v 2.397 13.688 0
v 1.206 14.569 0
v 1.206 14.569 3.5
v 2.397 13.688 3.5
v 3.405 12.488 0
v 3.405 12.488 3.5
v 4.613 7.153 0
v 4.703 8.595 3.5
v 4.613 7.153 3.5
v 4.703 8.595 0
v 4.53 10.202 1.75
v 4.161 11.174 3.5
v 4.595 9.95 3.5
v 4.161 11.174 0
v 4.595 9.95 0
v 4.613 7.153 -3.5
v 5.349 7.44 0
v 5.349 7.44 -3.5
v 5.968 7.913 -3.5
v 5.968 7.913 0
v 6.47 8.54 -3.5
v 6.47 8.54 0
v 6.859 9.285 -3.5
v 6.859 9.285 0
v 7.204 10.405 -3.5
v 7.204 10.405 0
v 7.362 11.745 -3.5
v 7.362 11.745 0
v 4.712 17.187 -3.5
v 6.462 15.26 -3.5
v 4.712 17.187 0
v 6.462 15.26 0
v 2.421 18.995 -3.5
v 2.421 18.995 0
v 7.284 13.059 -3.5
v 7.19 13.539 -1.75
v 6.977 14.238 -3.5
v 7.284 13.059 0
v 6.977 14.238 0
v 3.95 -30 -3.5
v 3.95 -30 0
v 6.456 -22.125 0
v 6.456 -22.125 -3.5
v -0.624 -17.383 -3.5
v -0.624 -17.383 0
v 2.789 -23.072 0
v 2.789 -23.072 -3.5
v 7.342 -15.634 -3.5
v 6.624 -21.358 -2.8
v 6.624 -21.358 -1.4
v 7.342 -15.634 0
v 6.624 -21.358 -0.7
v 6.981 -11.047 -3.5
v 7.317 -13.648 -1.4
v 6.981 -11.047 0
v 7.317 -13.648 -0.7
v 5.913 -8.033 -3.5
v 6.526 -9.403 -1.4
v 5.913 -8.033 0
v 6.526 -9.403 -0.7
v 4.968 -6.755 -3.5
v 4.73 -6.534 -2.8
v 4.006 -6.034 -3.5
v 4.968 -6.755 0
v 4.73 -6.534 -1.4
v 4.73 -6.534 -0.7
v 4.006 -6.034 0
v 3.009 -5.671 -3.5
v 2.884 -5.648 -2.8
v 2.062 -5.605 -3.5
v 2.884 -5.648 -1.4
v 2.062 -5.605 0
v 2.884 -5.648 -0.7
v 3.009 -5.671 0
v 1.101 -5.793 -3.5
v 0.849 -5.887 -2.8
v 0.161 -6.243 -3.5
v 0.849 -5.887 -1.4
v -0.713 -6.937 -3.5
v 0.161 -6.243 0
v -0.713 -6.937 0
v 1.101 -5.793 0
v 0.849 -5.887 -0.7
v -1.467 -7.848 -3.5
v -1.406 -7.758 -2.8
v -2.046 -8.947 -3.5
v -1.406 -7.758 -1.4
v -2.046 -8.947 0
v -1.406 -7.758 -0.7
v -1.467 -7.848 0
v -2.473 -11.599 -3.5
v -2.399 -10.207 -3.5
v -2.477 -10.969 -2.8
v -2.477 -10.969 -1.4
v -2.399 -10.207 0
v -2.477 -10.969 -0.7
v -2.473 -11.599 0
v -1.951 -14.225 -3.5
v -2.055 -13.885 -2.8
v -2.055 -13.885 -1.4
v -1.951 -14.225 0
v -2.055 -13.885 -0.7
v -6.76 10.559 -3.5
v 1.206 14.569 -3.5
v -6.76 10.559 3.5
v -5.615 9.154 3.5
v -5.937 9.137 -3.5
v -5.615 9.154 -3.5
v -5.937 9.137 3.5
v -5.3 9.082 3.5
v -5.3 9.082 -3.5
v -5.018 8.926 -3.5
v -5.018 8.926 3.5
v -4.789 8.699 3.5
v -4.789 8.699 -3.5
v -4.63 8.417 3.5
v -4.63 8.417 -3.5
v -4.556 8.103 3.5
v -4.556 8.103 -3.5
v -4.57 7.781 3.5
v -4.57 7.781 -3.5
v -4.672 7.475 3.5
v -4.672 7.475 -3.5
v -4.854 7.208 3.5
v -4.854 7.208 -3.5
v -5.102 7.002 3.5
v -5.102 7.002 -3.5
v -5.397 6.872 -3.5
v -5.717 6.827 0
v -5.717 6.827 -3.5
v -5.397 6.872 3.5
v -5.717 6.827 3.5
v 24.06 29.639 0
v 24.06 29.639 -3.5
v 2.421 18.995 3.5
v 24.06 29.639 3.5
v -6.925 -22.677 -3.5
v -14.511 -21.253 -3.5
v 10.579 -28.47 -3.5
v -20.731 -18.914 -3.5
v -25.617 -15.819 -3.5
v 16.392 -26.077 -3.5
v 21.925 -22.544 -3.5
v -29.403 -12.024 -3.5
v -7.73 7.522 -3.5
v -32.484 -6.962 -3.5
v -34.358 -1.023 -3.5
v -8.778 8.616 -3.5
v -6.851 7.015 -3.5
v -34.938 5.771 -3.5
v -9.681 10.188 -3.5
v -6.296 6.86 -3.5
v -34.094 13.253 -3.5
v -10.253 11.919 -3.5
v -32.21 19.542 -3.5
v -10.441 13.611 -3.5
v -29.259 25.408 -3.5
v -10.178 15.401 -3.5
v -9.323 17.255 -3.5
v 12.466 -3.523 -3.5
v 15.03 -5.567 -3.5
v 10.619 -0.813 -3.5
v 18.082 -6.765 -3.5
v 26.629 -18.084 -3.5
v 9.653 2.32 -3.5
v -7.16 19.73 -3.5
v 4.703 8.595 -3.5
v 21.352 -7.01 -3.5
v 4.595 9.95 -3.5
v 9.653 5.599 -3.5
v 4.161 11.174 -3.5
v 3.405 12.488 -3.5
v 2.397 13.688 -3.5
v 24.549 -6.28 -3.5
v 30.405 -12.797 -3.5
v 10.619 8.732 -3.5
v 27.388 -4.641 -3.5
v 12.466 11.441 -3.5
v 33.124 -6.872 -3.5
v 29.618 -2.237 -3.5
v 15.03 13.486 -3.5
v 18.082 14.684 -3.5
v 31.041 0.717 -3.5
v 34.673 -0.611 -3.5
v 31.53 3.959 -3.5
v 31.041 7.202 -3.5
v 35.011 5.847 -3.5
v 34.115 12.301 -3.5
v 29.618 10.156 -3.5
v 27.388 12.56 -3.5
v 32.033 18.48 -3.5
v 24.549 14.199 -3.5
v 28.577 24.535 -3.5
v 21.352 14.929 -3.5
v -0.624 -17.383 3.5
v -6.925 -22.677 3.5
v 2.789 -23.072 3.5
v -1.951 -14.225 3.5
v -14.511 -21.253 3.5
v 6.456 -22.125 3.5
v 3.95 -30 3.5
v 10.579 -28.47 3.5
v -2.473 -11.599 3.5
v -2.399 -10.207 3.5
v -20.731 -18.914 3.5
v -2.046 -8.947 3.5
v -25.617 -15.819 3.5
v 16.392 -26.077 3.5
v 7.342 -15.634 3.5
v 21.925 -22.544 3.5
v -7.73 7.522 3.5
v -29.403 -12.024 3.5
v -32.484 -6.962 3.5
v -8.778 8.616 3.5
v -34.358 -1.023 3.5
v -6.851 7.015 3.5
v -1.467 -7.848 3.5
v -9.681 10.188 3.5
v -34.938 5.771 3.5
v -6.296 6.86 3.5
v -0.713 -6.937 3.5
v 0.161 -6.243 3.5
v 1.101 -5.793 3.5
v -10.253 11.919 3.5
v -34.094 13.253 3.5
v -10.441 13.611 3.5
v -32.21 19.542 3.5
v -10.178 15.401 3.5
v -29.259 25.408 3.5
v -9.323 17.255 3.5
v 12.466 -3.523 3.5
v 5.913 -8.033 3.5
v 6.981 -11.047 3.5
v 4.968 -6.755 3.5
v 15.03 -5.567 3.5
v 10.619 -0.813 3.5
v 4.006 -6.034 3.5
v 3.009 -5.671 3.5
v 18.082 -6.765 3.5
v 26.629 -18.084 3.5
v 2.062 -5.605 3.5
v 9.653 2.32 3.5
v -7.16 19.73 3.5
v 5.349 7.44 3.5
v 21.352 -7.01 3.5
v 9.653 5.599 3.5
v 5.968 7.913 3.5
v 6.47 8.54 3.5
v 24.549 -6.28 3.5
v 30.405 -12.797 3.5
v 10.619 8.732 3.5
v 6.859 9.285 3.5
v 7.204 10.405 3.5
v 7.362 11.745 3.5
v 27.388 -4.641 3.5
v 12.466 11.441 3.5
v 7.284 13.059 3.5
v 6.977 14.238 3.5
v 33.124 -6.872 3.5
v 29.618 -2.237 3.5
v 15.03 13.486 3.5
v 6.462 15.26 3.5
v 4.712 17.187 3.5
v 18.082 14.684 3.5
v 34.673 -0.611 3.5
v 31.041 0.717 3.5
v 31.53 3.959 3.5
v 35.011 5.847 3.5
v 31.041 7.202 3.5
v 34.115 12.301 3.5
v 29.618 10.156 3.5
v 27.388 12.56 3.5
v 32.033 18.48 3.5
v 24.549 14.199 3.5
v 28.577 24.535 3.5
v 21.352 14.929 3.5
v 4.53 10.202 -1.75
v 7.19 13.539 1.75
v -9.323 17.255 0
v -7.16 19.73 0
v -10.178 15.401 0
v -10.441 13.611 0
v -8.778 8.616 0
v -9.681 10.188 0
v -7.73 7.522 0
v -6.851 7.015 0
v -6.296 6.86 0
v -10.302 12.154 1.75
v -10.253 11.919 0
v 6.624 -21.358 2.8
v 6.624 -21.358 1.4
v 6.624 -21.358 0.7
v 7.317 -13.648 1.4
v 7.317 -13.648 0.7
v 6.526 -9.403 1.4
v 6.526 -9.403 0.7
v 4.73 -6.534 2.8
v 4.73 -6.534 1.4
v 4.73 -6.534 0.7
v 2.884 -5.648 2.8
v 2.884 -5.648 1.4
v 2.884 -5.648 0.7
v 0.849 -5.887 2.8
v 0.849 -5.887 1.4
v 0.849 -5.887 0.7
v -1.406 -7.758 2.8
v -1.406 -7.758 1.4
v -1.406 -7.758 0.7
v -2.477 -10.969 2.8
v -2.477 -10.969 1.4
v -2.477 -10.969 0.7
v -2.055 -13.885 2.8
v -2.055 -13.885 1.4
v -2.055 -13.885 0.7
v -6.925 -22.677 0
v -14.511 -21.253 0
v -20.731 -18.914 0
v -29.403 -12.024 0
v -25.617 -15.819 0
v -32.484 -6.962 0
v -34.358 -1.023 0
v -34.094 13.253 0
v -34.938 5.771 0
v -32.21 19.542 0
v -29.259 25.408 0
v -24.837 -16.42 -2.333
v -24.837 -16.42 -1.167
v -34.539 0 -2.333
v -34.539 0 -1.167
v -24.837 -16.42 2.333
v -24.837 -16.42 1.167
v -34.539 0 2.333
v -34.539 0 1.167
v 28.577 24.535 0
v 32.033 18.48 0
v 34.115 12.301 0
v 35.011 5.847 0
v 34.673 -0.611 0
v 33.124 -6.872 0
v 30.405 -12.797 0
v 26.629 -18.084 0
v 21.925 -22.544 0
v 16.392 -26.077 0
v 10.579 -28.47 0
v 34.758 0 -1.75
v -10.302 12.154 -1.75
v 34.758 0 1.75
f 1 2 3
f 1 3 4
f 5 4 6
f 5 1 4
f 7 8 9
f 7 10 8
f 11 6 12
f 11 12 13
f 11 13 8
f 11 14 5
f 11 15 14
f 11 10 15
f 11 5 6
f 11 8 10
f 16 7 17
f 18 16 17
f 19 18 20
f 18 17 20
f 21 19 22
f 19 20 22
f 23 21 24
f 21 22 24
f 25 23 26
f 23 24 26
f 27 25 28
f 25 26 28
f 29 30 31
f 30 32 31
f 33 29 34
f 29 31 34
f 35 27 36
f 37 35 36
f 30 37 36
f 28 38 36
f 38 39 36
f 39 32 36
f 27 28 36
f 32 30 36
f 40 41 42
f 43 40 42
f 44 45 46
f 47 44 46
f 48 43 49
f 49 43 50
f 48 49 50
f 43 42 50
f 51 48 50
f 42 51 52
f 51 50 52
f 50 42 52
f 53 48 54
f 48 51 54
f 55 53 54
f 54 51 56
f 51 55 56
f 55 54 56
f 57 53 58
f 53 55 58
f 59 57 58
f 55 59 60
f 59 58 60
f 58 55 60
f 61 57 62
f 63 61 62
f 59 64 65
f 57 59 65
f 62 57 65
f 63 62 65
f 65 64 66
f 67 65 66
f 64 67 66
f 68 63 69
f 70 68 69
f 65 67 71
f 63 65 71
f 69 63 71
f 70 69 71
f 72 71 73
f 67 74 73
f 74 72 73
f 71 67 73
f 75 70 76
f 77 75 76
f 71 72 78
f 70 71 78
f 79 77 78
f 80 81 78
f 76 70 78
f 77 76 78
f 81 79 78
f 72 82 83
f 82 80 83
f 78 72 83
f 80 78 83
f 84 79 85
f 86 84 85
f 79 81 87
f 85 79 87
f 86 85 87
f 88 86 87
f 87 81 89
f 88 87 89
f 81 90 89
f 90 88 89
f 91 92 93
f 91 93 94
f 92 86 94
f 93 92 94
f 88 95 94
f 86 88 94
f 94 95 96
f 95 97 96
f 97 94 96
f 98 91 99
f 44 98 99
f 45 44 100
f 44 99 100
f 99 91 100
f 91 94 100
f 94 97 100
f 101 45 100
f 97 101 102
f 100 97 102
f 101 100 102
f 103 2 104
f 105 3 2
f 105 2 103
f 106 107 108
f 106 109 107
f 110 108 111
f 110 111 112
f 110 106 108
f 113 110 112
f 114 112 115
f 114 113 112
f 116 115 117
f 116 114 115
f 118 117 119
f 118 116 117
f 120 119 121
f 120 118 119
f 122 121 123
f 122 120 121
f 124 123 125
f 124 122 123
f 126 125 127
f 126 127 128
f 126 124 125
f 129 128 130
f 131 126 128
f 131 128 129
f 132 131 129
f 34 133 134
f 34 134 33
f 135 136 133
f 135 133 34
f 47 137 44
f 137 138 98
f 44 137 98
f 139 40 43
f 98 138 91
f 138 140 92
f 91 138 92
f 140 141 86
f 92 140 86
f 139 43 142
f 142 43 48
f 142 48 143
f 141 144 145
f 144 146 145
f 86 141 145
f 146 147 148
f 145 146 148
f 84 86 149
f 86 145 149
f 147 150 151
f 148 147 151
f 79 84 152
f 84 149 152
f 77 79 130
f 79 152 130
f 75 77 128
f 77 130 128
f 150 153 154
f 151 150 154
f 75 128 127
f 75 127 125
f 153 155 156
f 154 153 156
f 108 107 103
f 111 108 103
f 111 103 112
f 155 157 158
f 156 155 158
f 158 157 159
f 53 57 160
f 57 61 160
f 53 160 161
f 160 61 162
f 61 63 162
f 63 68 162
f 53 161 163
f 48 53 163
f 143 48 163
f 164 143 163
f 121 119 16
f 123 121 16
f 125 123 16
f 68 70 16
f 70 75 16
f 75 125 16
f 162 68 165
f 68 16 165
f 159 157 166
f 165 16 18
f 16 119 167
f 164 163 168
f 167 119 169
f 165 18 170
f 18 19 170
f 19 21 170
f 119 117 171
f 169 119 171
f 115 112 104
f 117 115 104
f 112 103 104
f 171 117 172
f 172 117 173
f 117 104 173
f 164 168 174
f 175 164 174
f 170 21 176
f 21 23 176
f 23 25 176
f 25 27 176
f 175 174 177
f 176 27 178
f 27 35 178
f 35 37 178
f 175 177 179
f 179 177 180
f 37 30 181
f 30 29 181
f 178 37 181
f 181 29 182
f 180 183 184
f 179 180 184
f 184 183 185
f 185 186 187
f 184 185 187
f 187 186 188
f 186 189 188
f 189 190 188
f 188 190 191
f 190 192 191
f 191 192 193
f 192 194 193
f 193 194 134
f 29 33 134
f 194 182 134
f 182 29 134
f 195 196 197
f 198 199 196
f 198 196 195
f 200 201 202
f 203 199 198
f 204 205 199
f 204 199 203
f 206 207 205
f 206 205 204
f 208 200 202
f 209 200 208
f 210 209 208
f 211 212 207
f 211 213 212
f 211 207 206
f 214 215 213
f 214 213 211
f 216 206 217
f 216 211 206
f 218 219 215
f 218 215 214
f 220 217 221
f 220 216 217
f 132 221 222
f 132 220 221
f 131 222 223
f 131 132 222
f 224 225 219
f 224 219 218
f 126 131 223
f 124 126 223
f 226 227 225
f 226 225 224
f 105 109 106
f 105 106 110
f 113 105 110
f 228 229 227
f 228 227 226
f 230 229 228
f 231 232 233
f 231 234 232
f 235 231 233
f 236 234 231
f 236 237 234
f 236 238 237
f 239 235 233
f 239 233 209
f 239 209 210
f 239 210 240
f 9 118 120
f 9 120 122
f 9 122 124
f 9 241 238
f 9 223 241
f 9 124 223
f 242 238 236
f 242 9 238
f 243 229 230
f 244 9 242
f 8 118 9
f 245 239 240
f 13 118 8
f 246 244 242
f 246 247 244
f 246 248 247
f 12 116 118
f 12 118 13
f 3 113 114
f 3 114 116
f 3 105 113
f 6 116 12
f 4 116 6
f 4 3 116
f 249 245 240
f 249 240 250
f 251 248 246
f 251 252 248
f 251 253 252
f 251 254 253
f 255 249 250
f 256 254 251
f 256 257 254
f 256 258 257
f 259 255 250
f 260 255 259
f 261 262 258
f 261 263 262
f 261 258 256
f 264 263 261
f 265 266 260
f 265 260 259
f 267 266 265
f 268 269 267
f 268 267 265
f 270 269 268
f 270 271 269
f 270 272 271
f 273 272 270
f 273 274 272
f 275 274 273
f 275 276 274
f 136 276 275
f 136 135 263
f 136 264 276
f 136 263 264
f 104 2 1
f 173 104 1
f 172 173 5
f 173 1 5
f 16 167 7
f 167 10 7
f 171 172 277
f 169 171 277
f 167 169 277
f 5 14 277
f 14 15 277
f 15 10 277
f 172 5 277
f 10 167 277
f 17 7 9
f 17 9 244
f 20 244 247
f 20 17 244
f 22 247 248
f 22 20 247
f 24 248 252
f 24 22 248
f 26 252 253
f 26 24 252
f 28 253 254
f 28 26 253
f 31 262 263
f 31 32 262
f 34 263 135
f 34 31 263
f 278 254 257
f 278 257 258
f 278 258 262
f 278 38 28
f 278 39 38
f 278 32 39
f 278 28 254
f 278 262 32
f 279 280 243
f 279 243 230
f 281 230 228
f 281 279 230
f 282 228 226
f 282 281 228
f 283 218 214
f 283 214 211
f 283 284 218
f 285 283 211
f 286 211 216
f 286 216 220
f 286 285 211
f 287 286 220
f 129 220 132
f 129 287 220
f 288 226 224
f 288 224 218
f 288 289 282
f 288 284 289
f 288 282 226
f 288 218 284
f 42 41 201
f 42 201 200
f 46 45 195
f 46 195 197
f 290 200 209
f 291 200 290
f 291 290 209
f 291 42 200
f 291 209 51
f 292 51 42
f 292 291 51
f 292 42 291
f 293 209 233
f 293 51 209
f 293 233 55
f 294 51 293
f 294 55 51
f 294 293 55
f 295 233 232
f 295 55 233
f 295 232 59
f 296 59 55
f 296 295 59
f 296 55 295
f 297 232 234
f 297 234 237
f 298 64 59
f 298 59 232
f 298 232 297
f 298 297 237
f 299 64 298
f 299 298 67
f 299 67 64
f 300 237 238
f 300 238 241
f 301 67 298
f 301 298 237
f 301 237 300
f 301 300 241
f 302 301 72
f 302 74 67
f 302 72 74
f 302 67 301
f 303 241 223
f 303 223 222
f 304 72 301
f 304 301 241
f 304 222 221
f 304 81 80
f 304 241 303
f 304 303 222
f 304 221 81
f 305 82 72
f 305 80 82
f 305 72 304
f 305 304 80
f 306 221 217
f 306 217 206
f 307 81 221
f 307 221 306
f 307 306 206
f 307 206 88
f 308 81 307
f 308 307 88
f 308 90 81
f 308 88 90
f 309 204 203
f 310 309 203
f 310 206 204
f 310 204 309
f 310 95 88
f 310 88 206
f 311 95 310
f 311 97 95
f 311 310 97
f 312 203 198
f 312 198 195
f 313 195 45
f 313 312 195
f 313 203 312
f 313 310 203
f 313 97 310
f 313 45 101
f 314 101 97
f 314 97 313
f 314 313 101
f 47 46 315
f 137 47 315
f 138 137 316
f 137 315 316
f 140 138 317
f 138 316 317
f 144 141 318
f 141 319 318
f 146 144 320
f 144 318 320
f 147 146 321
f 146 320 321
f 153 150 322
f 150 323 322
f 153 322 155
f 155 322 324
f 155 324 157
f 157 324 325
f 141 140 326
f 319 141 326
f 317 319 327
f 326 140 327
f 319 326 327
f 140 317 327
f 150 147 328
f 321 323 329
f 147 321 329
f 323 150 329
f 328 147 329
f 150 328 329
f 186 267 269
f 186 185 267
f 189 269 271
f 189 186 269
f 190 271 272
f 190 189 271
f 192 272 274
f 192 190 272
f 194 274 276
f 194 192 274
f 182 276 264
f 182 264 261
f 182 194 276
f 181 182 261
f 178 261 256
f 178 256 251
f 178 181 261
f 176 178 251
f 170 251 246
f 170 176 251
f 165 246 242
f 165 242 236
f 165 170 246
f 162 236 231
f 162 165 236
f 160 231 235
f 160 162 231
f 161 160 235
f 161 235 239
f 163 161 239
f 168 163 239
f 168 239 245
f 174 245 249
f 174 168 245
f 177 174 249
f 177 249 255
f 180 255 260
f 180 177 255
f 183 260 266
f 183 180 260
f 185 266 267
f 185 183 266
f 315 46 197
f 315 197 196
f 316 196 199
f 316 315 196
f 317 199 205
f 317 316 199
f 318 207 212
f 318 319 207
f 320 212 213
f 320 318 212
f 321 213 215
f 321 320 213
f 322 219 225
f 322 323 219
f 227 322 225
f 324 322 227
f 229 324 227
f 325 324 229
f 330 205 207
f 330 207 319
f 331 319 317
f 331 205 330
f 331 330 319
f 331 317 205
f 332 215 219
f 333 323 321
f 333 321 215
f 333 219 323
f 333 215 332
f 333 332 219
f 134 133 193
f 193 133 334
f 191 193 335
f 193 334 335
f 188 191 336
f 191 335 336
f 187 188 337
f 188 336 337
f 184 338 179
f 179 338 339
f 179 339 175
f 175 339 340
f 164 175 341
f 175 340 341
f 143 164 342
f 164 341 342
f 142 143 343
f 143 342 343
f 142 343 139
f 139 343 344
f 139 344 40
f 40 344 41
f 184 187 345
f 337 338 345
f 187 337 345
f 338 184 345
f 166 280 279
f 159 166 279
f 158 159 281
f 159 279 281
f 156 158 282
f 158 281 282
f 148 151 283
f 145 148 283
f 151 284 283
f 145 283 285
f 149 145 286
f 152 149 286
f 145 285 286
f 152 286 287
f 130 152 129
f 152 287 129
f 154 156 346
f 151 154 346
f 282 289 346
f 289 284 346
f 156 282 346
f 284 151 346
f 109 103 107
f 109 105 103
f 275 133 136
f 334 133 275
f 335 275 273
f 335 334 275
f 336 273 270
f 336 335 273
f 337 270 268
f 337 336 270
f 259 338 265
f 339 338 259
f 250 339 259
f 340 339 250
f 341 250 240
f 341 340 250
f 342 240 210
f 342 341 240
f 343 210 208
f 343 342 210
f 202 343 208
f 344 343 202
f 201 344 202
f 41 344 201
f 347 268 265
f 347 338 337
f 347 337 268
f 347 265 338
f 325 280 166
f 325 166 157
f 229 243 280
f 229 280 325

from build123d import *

# Parameters (mm, degrees)
F0_R     = 11
F1_DEPTH = 3.5


with BuildPart() as f1:
    # F0 (on Top) → F1 (new body, symmetric)
    with BuildSketch(Plane.XY):
        with BuildLine():
            ThreePointArc((-5.9371989536, 9.136938762), (-4.5556948826, 8.1032503328), (-5.7171564072, 6.8272909316))
            add(Edge.make_bspline(
                [(-7.1601356012, 19.7303443127), (-9.8396121009, 17.328055376), (-11.7631082296, 12.7037080844), (-7.991697676, 6.7025448219), (-5.7171564072, 6.8272909316)],
                knots=[0, 0, 0, 0, 0.5193023993, 1, 1, 1, 1], degree=3))
            Line((-7.1601356012, 19.7303443127), (-29.2586693251, 25.4083474436))
            add(Edge.make_bspline(
                [(2.7892878075, -23.0723533458), (-9.100445471, -23.3260705726), (-26.0312299774, -19.4058078659), (-37.3351362806, -0.3188714111), (-34.0472960433, 17.7900344429), (-29.2586693251, 25.4083474436)],
                knots=[0, 0, 0, 0, 0.3603746174, 0.6556097302, 1, 1, 1, 1], degree=3))
            add(Edge.make_bspline(
                [(3.9497939315, -30), (6.3200092463, -24.0845974018), (8.4418802977, -14.4410055096), (5.618321076, -5.9348622155), (0.4188786459, -5.0226176358), (-4.661613499, -11.3368669415), (0.3789602011, -19.4366700265), (2.7892878075, -23.0723533458)],
                knots=[0, 0, 0, 0, 0.2738856545, 0.4583152945, 0.591269181, 0.7564644707, 1, 1, 1, 1], degree=3))
            add(Edge.make_bspline(
                [(24.0596541754, 29.6391923389), (31.7168351337, 22.656535609), (41.5570833778, -1.6182185805), (23.0239544155, -27.1377676606), (3.9497939315, -30)],
                knots=[0, 0, 0, 0, 0.4612146425, 1, 1, 1, 1], degree=3))
            Line((24.0596541754, 29.6391923389), (2.4210962566, 18.9946021933))
            add(Edge.make_bspline(
                [(4.6126311388, 7.1527171592), (6.9798036393, 7.6946970927), (8.5434124721, 14.7188307272), (4.6365245457, 17.2686031477), (2.4210962566, 18.9946021933)],
                knots=[0, 0, 0, 0, 0.4936475393, 1, 1, 1, 1], degree=3))
            add(Edge.make_bspline(
                [(1.2064232823, 14.5694600899), (2.7917893894, 13.7439214682), (5.0913604942, 10.1353380455), (4.6597097129, 8.3324459978), (4.6126311388, 7.1527171592)],
                knots=[0, 0, 0, 0, 0.5729073376, 1, 1, 1, 1], degree=3))
            Line((1.2064232823, 14.5694600899), (-6.7597080421, 10.5589251693))
            Line((-6.7597080421, 10.5589251693), (-5.9371989536, 9.136938762))
        make_face()
        with Locations((20.5298382789, 3.9593884721)):
            Circle(F0_R, mode=Mode.SUBTRACT)
    extrude(amount=F1_DEPTH, both=True)


solid = f1.part
